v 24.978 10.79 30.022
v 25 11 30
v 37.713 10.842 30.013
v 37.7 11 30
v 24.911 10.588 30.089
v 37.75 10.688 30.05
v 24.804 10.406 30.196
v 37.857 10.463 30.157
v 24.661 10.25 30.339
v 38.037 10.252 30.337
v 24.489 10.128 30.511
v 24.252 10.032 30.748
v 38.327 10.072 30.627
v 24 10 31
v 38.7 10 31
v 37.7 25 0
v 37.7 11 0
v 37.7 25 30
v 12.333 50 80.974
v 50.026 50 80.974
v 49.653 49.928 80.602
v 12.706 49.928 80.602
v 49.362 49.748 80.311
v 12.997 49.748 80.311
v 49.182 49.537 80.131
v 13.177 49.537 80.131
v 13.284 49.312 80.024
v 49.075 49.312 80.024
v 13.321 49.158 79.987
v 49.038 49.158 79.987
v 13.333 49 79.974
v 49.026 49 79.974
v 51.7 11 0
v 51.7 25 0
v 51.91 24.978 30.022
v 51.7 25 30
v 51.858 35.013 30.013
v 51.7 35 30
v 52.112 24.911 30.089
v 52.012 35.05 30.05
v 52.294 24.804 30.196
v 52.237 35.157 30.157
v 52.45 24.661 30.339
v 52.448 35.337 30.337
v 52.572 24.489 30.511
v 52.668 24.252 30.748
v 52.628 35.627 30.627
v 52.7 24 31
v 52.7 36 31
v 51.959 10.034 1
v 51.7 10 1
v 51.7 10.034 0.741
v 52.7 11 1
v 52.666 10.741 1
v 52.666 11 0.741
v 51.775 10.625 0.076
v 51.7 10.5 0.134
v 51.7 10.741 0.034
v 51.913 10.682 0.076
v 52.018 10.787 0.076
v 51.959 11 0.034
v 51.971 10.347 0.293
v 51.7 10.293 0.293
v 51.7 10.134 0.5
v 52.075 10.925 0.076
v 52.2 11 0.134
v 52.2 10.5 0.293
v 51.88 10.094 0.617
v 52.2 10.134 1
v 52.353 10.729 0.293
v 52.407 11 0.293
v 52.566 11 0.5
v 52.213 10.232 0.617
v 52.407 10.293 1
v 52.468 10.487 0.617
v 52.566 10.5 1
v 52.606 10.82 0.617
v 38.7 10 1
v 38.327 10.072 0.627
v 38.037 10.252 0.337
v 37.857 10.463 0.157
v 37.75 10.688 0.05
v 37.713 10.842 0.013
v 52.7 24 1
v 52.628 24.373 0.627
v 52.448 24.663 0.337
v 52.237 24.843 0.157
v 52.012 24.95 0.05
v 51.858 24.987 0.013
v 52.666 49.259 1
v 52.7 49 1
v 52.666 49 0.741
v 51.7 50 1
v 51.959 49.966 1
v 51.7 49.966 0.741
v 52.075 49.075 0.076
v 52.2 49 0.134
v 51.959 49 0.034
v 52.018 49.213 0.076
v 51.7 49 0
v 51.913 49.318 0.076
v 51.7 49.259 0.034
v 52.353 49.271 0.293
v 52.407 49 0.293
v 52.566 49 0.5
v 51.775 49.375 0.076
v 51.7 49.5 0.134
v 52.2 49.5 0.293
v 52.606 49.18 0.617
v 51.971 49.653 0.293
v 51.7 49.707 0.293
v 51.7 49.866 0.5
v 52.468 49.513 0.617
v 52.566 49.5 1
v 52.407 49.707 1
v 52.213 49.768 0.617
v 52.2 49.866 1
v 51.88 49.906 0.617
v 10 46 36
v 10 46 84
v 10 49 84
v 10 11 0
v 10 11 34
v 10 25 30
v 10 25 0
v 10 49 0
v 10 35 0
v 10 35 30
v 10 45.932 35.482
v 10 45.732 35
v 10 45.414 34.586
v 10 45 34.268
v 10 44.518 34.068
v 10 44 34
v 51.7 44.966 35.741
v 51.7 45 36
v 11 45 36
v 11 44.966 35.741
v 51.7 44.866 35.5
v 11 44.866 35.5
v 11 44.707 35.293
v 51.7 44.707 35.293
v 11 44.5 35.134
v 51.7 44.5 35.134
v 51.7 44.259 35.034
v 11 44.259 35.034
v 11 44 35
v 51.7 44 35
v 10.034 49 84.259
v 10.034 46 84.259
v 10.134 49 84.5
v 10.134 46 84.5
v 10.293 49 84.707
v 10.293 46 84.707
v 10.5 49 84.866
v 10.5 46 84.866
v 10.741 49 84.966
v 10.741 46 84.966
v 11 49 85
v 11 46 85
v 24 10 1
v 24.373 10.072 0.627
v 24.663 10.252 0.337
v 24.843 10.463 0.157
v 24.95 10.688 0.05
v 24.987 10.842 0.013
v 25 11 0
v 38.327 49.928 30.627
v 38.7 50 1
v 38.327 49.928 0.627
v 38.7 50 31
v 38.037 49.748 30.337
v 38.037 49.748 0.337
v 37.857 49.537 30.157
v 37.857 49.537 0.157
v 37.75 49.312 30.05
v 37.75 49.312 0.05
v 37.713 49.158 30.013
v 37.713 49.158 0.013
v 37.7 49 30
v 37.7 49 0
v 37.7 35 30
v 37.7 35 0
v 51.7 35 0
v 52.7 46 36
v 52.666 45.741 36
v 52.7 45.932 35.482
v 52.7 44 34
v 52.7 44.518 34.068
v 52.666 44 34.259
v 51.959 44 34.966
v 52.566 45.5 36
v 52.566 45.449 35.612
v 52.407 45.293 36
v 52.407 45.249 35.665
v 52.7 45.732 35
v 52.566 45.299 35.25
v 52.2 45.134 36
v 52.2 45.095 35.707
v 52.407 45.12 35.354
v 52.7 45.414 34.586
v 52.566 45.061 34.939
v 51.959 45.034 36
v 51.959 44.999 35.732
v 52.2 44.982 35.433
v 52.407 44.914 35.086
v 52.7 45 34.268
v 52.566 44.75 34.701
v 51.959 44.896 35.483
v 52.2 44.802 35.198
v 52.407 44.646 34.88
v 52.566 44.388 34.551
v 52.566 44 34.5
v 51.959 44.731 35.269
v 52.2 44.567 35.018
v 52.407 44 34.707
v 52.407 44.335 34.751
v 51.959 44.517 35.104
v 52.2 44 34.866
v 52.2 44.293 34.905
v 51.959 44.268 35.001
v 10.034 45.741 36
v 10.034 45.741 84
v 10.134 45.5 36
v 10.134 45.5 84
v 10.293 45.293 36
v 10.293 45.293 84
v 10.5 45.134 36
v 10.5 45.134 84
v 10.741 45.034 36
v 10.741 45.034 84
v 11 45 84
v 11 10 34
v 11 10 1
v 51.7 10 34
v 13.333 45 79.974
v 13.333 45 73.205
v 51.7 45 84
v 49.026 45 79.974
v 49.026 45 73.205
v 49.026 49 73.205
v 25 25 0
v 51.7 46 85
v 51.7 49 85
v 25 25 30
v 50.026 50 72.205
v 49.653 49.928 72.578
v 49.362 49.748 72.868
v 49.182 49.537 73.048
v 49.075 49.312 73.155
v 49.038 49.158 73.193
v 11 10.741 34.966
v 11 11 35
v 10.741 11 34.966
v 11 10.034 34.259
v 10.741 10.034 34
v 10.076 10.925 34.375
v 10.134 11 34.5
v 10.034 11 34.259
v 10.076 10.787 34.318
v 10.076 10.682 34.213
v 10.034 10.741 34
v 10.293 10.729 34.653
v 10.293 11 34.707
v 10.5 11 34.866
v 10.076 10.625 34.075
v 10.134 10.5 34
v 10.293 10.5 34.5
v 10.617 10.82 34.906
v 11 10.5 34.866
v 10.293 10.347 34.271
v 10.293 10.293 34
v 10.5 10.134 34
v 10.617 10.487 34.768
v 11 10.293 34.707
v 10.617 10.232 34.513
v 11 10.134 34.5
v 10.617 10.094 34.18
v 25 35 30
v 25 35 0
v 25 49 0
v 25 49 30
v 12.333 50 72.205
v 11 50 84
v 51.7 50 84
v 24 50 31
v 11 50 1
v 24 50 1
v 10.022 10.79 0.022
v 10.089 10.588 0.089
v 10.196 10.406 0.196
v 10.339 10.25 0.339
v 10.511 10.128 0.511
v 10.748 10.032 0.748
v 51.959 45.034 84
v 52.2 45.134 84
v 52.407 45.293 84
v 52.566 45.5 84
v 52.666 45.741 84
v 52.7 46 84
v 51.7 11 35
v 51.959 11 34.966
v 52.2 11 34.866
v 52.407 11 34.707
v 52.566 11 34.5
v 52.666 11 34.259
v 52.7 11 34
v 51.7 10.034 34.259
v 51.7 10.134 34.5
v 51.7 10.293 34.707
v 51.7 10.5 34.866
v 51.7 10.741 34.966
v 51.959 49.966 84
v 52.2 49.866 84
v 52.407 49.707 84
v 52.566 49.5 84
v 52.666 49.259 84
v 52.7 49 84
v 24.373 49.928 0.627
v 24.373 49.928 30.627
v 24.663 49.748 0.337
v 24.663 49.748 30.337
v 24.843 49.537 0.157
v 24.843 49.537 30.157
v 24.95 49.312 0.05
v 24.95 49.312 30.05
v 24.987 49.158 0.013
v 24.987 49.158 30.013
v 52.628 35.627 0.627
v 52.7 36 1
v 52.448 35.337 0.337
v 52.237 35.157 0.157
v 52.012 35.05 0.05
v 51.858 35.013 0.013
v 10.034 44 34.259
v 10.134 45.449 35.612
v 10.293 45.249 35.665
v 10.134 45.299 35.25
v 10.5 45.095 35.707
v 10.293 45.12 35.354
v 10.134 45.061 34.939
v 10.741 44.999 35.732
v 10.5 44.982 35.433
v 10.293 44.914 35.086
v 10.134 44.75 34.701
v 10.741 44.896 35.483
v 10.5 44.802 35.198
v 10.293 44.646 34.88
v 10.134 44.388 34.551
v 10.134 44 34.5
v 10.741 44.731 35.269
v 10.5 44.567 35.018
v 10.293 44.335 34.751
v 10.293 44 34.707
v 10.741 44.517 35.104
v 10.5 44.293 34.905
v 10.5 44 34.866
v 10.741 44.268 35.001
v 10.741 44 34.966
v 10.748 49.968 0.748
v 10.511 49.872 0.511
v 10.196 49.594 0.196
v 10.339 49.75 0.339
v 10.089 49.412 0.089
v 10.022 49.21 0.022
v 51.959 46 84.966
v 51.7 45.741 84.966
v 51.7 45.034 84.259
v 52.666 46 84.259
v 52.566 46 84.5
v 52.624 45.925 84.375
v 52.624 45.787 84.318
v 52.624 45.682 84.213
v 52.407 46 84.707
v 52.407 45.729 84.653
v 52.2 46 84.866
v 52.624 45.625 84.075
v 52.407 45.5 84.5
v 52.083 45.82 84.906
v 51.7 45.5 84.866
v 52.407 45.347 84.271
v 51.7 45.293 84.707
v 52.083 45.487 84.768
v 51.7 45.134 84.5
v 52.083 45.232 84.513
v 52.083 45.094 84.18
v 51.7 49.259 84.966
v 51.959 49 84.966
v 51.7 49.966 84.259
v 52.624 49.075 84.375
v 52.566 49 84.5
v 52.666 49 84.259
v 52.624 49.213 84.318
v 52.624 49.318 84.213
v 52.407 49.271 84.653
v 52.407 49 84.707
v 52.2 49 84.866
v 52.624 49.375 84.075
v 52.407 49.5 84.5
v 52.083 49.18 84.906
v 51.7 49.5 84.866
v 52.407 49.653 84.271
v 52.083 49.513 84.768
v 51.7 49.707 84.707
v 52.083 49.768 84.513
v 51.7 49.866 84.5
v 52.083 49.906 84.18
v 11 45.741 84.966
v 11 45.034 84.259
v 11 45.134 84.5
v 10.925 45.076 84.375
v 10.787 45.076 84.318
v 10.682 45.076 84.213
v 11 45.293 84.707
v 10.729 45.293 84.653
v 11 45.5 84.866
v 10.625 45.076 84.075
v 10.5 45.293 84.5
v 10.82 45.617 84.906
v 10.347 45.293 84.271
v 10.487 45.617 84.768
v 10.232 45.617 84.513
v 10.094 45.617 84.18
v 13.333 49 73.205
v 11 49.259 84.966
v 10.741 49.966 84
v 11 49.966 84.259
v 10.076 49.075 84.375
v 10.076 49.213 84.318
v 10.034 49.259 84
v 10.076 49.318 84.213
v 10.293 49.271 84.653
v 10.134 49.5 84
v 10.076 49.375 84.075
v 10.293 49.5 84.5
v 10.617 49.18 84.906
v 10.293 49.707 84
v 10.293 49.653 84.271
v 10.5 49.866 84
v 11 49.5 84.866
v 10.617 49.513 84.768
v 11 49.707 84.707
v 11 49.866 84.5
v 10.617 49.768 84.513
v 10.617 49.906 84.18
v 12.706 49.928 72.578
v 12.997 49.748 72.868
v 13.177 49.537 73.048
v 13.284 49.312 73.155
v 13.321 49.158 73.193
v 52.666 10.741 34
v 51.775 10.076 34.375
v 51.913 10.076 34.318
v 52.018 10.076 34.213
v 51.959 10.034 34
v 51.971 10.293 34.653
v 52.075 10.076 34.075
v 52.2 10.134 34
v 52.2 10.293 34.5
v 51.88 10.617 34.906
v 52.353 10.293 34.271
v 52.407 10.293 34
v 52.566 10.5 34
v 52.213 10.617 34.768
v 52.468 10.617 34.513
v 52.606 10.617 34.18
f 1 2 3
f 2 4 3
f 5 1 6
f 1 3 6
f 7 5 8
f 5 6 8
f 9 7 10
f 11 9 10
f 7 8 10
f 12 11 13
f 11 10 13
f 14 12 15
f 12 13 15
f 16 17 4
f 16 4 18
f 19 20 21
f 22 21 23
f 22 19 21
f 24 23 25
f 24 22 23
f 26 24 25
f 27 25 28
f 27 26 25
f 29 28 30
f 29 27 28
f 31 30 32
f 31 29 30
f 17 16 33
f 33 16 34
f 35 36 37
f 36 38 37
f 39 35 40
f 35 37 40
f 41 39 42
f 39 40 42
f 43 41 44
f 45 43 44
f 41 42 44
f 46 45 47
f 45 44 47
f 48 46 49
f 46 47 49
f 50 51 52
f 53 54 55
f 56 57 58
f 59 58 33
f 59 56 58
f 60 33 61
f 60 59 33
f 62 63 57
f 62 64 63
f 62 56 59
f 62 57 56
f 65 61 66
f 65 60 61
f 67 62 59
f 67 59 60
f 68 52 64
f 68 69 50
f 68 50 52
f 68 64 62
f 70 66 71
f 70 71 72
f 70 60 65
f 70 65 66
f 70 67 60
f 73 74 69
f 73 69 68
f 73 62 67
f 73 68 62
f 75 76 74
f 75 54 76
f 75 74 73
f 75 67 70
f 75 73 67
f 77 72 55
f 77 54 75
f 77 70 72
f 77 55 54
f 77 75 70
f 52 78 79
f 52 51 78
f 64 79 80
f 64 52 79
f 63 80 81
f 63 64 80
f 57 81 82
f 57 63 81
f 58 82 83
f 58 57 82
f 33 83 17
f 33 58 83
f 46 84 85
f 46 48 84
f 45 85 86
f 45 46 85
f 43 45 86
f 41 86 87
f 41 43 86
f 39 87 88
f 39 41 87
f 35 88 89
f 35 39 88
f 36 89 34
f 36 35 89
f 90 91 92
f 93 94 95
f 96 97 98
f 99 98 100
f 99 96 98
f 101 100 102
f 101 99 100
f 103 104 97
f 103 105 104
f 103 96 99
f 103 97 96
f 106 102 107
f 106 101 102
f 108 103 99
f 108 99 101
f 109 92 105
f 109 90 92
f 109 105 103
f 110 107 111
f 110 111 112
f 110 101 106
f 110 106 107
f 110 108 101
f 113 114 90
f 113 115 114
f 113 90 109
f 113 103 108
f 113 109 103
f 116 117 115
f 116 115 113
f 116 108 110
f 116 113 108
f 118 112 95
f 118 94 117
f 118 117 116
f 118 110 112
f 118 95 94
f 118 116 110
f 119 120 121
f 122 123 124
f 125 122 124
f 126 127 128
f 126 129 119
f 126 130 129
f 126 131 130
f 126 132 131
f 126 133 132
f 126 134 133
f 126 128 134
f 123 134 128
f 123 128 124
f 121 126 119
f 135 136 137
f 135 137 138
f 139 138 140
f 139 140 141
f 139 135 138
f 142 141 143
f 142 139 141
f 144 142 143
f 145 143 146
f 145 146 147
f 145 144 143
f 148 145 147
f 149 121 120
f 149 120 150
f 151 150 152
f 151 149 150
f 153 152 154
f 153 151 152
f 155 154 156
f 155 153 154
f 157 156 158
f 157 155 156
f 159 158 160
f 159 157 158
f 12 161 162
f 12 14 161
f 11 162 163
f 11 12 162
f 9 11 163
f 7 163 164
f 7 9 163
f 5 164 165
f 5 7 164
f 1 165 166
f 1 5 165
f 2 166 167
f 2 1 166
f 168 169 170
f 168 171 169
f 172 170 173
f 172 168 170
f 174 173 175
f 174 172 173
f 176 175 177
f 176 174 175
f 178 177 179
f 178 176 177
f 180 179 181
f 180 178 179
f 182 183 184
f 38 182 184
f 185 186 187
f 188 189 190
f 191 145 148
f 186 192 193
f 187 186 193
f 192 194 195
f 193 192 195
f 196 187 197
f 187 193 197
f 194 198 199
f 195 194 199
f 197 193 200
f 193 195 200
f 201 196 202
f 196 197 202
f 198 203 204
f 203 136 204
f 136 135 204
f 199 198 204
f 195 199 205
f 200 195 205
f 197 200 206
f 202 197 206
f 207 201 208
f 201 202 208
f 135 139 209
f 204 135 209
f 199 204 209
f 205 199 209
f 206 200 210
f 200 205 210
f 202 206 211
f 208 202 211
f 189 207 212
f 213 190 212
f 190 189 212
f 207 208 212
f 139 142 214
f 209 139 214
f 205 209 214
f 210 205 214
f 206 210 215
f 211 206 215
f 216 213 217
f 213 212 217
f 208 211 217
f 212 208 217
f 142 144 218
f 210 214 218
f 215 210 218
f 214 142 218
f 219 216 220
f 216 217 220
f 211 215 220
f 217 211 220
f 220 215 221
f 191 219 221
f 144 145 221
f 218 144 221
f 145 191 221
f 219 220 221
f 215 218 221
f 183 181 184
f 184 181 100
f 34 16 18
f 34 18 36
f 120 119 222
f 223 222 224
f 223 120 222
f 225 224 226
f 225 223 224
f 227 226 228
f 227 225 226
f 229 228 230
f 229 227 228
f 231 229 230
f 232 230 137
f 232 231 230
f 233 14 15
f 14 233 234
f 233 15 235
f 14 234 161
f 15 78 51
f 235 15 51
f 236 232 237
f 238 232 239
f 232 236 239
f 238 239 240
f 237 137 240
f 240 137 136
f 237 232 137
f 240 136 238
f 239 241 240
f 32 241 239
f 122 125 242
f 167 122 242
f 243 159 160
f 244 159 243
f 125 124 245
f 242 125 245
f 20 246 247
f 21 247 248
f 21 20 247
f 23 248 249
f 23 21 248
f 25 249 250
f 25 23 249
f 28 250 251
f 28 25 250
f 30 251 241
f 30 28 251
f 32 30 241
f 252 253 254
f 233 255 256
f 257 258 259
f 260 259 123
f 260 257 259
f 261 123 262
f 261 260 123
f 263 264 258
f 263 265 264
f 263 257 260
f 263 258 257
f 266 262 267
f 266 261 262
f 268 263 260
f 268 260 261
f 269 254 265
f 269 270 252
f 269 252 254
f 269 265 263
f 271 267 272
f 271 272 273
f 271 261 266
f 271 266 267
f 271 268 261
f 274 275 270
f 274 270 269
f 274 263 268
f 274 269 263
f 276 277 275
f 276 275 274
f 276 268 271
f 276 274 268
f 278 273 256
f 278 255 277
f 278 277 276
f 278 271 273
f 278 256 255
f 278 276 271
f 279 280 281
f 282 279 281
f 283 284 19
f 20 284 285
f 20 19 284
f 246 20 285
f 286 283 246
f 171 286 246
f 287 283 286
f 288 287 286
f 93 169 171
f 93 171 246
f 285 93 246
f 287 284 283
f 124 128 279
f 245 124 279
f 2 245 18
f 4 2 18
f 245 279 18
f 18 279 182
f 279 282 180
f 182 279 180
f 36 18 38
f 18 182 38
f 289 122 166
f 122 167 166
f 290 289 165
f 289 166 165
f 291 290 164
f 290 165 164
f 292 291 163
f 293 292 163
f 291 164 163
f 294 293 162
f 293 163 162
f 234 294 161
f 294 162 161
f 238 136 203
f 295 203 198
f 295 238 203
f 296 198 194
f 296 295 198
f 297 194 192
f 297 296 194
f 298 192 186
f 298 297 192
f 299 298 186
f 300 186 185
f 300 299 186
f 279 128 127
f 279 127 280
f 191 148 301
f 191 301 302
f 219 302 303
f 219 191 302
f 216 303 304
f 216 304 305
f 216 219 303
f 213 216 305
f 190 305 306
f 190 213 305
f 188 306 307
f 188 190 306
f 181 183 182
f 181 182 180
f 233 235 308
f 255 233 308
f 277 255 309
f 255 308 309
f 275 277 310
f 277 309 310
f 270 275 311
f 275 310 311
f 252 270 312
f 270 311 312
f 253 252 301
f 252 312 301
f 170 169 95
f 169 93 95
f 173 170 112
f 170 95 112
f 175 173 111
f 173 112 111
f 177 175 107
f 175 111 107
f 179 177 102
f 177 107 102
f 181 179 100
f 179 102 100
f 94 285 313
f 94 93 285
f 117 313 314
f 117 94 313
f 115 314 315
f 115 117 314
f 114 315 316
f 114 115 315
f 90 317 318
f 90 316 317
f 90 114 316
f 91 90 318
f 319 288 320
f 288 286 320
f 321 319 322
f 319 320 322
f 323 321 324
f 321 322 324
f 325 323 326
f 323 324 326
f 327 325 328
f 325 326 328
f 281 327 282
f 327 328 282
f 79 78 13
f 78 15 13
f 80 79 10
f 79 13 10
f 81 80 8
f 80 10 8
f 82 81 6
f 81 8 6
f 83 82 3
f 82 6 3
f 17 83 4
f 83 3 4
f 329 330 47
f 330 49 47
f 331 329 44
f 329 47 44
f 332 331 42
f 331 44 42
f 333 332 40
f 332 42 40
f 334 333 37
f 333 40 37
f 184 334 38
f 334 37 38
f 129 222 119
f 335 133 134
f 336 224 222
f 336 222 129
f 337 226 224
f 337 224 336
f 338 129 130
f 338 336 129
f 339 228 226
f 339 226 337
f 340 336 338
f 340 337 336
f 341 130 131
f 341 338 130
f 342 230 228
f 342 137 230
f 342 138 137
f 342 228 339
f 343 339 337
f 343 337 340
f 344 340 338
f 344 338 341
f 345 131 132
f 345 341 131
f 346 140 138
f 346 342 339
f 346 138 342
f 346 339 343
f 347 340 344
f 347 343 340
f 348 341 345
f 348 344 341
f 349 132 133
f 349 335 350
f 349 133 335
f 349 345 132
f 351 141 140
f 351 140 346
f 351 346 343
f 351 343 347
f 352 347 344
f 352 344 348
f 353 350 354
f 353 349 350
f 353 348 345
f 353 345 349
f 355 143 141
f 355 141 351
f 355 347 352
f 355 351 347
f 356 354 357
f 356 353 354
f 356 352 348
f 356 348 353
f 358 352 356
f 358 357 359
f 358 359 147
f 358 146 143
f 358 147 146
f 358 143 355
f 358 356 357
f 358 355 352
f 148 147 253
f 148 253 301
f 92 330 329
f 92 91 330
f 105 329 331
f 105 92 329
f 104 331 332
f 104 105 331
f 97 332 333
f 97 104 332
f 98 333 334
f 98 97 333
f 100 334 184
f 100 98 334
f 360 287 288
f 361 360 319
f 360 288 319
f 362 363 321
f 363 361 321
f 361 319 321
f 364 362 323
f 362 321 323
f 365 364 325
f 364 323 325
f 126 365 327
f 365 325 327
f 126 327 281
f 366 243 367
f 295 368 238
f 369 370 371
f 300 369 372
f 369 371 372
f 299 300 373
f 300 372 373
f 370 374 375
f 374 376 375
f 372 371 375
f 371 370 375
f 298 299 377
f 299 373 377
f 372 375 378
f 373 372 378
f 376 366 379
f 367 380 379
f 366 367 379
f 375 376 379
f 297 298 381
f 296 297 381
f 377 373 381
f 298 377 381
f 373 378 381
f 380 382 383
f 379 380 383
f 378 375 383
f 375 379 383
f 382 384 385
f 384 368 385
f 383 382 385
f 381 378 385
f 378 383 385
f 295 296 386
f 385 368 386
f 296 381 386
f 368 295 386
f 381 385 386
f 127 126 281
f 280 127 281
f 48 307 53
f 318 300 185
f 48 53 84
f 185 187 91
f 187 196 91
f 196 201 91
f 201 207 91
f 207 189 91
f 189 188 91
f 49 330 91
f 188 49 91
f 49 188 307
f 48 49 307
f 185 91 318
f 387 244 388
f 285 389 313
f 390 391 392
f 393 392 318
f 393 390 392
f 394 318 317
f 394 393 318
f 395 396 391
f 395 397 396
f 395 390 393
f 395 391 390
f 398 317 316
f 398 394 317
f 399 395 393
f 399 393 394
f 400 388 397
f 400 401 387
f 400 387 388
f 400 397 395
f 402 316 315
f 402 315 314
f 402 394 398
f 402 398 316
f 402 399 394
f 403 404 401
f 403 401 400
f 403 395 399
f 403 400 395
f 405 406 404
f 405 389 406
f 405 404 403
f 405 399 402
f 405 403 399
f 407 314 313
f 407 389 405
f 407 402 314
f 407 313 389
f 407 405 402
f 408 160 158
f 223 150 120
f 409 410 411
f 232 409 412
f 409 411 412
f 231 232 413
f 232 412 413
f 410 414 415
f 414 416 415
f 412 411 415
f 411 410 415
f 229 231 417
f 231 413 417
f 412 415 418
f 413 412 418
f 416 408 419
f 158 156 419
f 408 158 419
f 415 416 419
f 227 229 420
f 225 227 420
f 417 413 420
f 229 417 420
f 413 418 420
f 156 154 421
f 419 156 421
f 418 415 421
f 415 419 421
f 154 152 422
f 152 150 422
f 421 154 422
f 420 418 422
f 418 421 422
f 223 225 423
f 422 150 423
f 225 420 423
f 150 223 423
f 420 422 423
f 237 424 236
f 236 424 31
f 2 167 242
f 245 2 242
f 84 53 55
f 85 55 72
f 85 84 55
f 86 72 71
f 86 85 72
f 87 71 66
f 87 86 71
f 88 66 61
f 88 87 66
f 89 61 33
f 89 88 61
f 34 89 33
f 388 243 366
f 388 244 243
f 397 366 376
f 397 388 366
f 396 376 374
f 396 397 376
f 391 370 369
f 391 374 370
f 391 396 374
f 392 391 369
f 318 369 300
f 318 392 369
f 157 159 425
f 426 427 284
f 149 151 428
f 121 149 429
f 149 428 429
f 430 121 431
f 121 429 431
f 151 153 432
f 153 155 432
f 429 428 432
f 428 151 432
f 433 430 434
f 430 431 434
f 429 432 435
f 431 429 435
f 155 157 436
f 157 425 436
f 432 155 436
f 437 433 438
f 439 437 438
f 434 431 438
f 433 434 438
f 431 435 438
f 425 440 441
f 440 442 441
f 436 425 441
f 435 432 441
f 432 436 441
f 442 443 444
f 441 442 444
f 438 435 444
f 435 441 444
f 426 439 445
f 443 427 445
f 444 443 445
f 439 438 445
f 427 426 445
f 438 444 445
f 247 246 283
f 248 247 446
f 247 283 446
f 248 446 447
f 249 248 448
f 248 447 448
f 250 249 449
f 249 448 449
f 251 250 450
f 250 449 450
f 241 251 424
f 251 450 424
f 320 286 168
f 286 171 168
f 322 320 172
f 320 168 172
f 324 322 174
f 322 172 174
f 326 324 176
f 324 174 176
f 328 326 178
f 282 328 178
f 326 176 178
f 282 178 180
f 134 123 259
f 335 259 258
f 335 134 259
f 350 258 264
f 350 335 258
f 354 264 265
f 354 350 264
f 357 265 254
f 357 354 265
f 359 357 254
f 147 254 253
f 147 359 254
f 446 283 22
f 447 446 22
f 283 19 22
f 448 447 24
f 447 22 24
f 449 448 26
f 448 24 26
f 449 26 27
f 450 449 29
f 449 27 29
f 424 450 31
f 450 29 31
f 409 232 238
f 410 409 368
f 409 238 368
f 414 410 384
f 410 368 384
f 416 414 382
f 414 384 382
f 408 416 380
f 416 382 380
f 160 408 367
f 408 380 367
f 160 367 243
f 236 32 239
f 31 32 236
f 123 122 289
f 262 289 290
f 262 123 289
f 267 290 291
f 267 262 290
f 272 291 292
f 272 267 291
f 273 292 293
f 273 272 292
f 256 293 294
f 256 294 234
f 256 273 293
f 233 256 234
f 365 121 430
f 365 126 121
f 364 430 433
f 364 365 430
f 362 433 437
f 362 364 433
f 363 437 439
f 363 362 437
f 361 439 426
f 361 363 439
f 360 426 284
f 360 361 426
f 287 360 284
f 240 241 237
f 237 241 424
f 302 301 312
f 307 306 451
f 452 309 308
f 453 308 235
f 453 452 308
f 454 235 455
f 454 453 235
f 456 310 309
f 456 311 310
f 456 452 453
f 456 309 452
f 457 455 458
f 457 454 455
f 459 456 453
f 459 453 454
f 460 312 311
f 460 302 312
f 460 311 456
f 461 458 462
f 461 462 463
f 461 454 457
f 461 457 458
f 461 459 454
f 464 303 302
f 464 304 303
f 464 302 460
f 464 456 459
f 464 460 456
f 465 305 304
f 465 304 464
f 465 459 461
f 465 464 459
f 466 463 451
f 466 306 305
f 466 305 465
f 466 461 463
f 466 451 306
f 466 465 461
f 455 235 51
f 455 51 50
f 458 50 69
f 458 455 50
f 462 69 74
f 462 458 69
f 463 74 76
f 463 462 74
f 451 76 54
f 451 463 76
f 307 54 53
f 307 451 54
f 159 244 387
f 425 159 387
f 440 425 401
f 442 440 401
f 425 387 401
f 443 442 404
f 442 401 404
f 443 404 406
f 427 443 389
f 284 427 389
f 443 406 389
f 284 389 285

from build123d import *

# Parameters (mm, degrees)
F0_W     = 15
F0_H     = 15
F1_DEPTH = 30
F2_W     = 42.7
F2_H     = 40
F3_DEPTH = 5
F4_W     = 42.7
F4_H     = 5
F5_DEPTH = 50
F6_W     = 35.6923062354
F6_H     = 6.7692324519
F7_DEPTH = 25
F8_R     = 1


with BuildPart() as f1:
    # F0 (on Top) → F1 (new body)
    with BuildSketch(Plane.XY):
        with Locations((17.5, 17.5)):
            Rectangle(F0_W, F0_H)
    extrude(amount=F1_DEPTH)



with BuildPart() as f1b:
    # F0 (on Top) → F1, piece 2 (new body)
    with BuildSketch(Plane.XY):
        with Locations((17.5, 42.5)):
            Rectangle(F0_W, F0_H)
    extrude(amount=F1_DEPTH)


with BuildPart() as f1c:
    # F0 (on Top) → F1, piece 3 (new body)
    with BuildSketch(Plane.XY):
        with Locations((45.2, 17.5)):
            Rectangle(F0_W, F0_H)
    extrude(amount=F1_DEPTH)


with BuildPart() as f1d:
    # F0 (on Top) → F1, piece 4 (new body)
    with BuildSketch(Plane.XY):
        with Locations((45.2, 42.5)):
            Rectangle(F0_W, F0_H)
    extrude(amount=F1_DEPTH)


with BuildPart() as f1_1:
    add(f1.part)

    add(f1b.part)  # F3 merges F1b

    add(f1c.part)  # F3 merges F1c

    add(f1d.part)  # F3 merges F1d
    # F2 (on face) → F3 (join)
    with BuildSketch(Plane.XY.offset(30)):
        with Locations((31.35, 30)):
            Rectangle(F2_W, F2_H)
    extrude(amount=F3_DEPTH)

    # F4 (on face) → F5 (join)
    with BuildSketch(Plane.XY.offset(35)):
        with Locations((31.35, 47.5)):
            Rectangle(F4_W, F4_H)
    extrude(amount=F5_DEPTH)

    # F6 (on face) → F7 (cut)
    with BuildSketch(Plane(origin=(0, 50, 0), x_dir=(-1, 0, 0), z_dir=(0, 1, 0))):
        with Locations((-31.1794867739, 76.5897445381)):
            Rectangle(F6_W, F6_H)
    extrude(amount=-F7_DEPTH, mode=Mode.SUBTRACT)

    # F8
    f8_edges = [f1_1.edges().sort_by_distance(p)[0] for p in [
        (52.7, 27.5, 35),
        (31.35, 10, 35),
        (10, 27.5, 35),
        (31.35, 45, 35),
        (31.35, 50, 85),
        (10, 47.5, 85),
        (31.35, 45, 85),
        (52.7, 47.5, 85),
        (37.7, 10, 15),
        (31.35, 10, 30),
        (25, 10, 15),
        (17.5, 10, 0),
        (10, 10, 17.5),
        (52.7, 10, 17.5),
        (45.2, 10, 0),
        (52.7, 35, 15),
        (52.7, 30, 30),
        (52.7, 25, 15),
        (52.7, 17.5, 0),
        (52.7, 45, 60),
        (52.7, 50, 42.5),
        (52.7, 42.5, 0),
        (45.2, 50, 0),
        (10, 50, 42.5),
        (37.7, 50, 15),
        (17.5, 50, 0),
        (31.35, 50, 30),
        (25, 50, 15),
        (13.333334, 50, 76.589745),
        (31.179487, 50, 73.205128),
        (49.02564, 50, 76.589745),
        (31.179487, 50, 79.974361),
        (10, 45, 60),
    ]]
    fillet(f8_edges, radius=F8_R)


solid = f1_1.part
